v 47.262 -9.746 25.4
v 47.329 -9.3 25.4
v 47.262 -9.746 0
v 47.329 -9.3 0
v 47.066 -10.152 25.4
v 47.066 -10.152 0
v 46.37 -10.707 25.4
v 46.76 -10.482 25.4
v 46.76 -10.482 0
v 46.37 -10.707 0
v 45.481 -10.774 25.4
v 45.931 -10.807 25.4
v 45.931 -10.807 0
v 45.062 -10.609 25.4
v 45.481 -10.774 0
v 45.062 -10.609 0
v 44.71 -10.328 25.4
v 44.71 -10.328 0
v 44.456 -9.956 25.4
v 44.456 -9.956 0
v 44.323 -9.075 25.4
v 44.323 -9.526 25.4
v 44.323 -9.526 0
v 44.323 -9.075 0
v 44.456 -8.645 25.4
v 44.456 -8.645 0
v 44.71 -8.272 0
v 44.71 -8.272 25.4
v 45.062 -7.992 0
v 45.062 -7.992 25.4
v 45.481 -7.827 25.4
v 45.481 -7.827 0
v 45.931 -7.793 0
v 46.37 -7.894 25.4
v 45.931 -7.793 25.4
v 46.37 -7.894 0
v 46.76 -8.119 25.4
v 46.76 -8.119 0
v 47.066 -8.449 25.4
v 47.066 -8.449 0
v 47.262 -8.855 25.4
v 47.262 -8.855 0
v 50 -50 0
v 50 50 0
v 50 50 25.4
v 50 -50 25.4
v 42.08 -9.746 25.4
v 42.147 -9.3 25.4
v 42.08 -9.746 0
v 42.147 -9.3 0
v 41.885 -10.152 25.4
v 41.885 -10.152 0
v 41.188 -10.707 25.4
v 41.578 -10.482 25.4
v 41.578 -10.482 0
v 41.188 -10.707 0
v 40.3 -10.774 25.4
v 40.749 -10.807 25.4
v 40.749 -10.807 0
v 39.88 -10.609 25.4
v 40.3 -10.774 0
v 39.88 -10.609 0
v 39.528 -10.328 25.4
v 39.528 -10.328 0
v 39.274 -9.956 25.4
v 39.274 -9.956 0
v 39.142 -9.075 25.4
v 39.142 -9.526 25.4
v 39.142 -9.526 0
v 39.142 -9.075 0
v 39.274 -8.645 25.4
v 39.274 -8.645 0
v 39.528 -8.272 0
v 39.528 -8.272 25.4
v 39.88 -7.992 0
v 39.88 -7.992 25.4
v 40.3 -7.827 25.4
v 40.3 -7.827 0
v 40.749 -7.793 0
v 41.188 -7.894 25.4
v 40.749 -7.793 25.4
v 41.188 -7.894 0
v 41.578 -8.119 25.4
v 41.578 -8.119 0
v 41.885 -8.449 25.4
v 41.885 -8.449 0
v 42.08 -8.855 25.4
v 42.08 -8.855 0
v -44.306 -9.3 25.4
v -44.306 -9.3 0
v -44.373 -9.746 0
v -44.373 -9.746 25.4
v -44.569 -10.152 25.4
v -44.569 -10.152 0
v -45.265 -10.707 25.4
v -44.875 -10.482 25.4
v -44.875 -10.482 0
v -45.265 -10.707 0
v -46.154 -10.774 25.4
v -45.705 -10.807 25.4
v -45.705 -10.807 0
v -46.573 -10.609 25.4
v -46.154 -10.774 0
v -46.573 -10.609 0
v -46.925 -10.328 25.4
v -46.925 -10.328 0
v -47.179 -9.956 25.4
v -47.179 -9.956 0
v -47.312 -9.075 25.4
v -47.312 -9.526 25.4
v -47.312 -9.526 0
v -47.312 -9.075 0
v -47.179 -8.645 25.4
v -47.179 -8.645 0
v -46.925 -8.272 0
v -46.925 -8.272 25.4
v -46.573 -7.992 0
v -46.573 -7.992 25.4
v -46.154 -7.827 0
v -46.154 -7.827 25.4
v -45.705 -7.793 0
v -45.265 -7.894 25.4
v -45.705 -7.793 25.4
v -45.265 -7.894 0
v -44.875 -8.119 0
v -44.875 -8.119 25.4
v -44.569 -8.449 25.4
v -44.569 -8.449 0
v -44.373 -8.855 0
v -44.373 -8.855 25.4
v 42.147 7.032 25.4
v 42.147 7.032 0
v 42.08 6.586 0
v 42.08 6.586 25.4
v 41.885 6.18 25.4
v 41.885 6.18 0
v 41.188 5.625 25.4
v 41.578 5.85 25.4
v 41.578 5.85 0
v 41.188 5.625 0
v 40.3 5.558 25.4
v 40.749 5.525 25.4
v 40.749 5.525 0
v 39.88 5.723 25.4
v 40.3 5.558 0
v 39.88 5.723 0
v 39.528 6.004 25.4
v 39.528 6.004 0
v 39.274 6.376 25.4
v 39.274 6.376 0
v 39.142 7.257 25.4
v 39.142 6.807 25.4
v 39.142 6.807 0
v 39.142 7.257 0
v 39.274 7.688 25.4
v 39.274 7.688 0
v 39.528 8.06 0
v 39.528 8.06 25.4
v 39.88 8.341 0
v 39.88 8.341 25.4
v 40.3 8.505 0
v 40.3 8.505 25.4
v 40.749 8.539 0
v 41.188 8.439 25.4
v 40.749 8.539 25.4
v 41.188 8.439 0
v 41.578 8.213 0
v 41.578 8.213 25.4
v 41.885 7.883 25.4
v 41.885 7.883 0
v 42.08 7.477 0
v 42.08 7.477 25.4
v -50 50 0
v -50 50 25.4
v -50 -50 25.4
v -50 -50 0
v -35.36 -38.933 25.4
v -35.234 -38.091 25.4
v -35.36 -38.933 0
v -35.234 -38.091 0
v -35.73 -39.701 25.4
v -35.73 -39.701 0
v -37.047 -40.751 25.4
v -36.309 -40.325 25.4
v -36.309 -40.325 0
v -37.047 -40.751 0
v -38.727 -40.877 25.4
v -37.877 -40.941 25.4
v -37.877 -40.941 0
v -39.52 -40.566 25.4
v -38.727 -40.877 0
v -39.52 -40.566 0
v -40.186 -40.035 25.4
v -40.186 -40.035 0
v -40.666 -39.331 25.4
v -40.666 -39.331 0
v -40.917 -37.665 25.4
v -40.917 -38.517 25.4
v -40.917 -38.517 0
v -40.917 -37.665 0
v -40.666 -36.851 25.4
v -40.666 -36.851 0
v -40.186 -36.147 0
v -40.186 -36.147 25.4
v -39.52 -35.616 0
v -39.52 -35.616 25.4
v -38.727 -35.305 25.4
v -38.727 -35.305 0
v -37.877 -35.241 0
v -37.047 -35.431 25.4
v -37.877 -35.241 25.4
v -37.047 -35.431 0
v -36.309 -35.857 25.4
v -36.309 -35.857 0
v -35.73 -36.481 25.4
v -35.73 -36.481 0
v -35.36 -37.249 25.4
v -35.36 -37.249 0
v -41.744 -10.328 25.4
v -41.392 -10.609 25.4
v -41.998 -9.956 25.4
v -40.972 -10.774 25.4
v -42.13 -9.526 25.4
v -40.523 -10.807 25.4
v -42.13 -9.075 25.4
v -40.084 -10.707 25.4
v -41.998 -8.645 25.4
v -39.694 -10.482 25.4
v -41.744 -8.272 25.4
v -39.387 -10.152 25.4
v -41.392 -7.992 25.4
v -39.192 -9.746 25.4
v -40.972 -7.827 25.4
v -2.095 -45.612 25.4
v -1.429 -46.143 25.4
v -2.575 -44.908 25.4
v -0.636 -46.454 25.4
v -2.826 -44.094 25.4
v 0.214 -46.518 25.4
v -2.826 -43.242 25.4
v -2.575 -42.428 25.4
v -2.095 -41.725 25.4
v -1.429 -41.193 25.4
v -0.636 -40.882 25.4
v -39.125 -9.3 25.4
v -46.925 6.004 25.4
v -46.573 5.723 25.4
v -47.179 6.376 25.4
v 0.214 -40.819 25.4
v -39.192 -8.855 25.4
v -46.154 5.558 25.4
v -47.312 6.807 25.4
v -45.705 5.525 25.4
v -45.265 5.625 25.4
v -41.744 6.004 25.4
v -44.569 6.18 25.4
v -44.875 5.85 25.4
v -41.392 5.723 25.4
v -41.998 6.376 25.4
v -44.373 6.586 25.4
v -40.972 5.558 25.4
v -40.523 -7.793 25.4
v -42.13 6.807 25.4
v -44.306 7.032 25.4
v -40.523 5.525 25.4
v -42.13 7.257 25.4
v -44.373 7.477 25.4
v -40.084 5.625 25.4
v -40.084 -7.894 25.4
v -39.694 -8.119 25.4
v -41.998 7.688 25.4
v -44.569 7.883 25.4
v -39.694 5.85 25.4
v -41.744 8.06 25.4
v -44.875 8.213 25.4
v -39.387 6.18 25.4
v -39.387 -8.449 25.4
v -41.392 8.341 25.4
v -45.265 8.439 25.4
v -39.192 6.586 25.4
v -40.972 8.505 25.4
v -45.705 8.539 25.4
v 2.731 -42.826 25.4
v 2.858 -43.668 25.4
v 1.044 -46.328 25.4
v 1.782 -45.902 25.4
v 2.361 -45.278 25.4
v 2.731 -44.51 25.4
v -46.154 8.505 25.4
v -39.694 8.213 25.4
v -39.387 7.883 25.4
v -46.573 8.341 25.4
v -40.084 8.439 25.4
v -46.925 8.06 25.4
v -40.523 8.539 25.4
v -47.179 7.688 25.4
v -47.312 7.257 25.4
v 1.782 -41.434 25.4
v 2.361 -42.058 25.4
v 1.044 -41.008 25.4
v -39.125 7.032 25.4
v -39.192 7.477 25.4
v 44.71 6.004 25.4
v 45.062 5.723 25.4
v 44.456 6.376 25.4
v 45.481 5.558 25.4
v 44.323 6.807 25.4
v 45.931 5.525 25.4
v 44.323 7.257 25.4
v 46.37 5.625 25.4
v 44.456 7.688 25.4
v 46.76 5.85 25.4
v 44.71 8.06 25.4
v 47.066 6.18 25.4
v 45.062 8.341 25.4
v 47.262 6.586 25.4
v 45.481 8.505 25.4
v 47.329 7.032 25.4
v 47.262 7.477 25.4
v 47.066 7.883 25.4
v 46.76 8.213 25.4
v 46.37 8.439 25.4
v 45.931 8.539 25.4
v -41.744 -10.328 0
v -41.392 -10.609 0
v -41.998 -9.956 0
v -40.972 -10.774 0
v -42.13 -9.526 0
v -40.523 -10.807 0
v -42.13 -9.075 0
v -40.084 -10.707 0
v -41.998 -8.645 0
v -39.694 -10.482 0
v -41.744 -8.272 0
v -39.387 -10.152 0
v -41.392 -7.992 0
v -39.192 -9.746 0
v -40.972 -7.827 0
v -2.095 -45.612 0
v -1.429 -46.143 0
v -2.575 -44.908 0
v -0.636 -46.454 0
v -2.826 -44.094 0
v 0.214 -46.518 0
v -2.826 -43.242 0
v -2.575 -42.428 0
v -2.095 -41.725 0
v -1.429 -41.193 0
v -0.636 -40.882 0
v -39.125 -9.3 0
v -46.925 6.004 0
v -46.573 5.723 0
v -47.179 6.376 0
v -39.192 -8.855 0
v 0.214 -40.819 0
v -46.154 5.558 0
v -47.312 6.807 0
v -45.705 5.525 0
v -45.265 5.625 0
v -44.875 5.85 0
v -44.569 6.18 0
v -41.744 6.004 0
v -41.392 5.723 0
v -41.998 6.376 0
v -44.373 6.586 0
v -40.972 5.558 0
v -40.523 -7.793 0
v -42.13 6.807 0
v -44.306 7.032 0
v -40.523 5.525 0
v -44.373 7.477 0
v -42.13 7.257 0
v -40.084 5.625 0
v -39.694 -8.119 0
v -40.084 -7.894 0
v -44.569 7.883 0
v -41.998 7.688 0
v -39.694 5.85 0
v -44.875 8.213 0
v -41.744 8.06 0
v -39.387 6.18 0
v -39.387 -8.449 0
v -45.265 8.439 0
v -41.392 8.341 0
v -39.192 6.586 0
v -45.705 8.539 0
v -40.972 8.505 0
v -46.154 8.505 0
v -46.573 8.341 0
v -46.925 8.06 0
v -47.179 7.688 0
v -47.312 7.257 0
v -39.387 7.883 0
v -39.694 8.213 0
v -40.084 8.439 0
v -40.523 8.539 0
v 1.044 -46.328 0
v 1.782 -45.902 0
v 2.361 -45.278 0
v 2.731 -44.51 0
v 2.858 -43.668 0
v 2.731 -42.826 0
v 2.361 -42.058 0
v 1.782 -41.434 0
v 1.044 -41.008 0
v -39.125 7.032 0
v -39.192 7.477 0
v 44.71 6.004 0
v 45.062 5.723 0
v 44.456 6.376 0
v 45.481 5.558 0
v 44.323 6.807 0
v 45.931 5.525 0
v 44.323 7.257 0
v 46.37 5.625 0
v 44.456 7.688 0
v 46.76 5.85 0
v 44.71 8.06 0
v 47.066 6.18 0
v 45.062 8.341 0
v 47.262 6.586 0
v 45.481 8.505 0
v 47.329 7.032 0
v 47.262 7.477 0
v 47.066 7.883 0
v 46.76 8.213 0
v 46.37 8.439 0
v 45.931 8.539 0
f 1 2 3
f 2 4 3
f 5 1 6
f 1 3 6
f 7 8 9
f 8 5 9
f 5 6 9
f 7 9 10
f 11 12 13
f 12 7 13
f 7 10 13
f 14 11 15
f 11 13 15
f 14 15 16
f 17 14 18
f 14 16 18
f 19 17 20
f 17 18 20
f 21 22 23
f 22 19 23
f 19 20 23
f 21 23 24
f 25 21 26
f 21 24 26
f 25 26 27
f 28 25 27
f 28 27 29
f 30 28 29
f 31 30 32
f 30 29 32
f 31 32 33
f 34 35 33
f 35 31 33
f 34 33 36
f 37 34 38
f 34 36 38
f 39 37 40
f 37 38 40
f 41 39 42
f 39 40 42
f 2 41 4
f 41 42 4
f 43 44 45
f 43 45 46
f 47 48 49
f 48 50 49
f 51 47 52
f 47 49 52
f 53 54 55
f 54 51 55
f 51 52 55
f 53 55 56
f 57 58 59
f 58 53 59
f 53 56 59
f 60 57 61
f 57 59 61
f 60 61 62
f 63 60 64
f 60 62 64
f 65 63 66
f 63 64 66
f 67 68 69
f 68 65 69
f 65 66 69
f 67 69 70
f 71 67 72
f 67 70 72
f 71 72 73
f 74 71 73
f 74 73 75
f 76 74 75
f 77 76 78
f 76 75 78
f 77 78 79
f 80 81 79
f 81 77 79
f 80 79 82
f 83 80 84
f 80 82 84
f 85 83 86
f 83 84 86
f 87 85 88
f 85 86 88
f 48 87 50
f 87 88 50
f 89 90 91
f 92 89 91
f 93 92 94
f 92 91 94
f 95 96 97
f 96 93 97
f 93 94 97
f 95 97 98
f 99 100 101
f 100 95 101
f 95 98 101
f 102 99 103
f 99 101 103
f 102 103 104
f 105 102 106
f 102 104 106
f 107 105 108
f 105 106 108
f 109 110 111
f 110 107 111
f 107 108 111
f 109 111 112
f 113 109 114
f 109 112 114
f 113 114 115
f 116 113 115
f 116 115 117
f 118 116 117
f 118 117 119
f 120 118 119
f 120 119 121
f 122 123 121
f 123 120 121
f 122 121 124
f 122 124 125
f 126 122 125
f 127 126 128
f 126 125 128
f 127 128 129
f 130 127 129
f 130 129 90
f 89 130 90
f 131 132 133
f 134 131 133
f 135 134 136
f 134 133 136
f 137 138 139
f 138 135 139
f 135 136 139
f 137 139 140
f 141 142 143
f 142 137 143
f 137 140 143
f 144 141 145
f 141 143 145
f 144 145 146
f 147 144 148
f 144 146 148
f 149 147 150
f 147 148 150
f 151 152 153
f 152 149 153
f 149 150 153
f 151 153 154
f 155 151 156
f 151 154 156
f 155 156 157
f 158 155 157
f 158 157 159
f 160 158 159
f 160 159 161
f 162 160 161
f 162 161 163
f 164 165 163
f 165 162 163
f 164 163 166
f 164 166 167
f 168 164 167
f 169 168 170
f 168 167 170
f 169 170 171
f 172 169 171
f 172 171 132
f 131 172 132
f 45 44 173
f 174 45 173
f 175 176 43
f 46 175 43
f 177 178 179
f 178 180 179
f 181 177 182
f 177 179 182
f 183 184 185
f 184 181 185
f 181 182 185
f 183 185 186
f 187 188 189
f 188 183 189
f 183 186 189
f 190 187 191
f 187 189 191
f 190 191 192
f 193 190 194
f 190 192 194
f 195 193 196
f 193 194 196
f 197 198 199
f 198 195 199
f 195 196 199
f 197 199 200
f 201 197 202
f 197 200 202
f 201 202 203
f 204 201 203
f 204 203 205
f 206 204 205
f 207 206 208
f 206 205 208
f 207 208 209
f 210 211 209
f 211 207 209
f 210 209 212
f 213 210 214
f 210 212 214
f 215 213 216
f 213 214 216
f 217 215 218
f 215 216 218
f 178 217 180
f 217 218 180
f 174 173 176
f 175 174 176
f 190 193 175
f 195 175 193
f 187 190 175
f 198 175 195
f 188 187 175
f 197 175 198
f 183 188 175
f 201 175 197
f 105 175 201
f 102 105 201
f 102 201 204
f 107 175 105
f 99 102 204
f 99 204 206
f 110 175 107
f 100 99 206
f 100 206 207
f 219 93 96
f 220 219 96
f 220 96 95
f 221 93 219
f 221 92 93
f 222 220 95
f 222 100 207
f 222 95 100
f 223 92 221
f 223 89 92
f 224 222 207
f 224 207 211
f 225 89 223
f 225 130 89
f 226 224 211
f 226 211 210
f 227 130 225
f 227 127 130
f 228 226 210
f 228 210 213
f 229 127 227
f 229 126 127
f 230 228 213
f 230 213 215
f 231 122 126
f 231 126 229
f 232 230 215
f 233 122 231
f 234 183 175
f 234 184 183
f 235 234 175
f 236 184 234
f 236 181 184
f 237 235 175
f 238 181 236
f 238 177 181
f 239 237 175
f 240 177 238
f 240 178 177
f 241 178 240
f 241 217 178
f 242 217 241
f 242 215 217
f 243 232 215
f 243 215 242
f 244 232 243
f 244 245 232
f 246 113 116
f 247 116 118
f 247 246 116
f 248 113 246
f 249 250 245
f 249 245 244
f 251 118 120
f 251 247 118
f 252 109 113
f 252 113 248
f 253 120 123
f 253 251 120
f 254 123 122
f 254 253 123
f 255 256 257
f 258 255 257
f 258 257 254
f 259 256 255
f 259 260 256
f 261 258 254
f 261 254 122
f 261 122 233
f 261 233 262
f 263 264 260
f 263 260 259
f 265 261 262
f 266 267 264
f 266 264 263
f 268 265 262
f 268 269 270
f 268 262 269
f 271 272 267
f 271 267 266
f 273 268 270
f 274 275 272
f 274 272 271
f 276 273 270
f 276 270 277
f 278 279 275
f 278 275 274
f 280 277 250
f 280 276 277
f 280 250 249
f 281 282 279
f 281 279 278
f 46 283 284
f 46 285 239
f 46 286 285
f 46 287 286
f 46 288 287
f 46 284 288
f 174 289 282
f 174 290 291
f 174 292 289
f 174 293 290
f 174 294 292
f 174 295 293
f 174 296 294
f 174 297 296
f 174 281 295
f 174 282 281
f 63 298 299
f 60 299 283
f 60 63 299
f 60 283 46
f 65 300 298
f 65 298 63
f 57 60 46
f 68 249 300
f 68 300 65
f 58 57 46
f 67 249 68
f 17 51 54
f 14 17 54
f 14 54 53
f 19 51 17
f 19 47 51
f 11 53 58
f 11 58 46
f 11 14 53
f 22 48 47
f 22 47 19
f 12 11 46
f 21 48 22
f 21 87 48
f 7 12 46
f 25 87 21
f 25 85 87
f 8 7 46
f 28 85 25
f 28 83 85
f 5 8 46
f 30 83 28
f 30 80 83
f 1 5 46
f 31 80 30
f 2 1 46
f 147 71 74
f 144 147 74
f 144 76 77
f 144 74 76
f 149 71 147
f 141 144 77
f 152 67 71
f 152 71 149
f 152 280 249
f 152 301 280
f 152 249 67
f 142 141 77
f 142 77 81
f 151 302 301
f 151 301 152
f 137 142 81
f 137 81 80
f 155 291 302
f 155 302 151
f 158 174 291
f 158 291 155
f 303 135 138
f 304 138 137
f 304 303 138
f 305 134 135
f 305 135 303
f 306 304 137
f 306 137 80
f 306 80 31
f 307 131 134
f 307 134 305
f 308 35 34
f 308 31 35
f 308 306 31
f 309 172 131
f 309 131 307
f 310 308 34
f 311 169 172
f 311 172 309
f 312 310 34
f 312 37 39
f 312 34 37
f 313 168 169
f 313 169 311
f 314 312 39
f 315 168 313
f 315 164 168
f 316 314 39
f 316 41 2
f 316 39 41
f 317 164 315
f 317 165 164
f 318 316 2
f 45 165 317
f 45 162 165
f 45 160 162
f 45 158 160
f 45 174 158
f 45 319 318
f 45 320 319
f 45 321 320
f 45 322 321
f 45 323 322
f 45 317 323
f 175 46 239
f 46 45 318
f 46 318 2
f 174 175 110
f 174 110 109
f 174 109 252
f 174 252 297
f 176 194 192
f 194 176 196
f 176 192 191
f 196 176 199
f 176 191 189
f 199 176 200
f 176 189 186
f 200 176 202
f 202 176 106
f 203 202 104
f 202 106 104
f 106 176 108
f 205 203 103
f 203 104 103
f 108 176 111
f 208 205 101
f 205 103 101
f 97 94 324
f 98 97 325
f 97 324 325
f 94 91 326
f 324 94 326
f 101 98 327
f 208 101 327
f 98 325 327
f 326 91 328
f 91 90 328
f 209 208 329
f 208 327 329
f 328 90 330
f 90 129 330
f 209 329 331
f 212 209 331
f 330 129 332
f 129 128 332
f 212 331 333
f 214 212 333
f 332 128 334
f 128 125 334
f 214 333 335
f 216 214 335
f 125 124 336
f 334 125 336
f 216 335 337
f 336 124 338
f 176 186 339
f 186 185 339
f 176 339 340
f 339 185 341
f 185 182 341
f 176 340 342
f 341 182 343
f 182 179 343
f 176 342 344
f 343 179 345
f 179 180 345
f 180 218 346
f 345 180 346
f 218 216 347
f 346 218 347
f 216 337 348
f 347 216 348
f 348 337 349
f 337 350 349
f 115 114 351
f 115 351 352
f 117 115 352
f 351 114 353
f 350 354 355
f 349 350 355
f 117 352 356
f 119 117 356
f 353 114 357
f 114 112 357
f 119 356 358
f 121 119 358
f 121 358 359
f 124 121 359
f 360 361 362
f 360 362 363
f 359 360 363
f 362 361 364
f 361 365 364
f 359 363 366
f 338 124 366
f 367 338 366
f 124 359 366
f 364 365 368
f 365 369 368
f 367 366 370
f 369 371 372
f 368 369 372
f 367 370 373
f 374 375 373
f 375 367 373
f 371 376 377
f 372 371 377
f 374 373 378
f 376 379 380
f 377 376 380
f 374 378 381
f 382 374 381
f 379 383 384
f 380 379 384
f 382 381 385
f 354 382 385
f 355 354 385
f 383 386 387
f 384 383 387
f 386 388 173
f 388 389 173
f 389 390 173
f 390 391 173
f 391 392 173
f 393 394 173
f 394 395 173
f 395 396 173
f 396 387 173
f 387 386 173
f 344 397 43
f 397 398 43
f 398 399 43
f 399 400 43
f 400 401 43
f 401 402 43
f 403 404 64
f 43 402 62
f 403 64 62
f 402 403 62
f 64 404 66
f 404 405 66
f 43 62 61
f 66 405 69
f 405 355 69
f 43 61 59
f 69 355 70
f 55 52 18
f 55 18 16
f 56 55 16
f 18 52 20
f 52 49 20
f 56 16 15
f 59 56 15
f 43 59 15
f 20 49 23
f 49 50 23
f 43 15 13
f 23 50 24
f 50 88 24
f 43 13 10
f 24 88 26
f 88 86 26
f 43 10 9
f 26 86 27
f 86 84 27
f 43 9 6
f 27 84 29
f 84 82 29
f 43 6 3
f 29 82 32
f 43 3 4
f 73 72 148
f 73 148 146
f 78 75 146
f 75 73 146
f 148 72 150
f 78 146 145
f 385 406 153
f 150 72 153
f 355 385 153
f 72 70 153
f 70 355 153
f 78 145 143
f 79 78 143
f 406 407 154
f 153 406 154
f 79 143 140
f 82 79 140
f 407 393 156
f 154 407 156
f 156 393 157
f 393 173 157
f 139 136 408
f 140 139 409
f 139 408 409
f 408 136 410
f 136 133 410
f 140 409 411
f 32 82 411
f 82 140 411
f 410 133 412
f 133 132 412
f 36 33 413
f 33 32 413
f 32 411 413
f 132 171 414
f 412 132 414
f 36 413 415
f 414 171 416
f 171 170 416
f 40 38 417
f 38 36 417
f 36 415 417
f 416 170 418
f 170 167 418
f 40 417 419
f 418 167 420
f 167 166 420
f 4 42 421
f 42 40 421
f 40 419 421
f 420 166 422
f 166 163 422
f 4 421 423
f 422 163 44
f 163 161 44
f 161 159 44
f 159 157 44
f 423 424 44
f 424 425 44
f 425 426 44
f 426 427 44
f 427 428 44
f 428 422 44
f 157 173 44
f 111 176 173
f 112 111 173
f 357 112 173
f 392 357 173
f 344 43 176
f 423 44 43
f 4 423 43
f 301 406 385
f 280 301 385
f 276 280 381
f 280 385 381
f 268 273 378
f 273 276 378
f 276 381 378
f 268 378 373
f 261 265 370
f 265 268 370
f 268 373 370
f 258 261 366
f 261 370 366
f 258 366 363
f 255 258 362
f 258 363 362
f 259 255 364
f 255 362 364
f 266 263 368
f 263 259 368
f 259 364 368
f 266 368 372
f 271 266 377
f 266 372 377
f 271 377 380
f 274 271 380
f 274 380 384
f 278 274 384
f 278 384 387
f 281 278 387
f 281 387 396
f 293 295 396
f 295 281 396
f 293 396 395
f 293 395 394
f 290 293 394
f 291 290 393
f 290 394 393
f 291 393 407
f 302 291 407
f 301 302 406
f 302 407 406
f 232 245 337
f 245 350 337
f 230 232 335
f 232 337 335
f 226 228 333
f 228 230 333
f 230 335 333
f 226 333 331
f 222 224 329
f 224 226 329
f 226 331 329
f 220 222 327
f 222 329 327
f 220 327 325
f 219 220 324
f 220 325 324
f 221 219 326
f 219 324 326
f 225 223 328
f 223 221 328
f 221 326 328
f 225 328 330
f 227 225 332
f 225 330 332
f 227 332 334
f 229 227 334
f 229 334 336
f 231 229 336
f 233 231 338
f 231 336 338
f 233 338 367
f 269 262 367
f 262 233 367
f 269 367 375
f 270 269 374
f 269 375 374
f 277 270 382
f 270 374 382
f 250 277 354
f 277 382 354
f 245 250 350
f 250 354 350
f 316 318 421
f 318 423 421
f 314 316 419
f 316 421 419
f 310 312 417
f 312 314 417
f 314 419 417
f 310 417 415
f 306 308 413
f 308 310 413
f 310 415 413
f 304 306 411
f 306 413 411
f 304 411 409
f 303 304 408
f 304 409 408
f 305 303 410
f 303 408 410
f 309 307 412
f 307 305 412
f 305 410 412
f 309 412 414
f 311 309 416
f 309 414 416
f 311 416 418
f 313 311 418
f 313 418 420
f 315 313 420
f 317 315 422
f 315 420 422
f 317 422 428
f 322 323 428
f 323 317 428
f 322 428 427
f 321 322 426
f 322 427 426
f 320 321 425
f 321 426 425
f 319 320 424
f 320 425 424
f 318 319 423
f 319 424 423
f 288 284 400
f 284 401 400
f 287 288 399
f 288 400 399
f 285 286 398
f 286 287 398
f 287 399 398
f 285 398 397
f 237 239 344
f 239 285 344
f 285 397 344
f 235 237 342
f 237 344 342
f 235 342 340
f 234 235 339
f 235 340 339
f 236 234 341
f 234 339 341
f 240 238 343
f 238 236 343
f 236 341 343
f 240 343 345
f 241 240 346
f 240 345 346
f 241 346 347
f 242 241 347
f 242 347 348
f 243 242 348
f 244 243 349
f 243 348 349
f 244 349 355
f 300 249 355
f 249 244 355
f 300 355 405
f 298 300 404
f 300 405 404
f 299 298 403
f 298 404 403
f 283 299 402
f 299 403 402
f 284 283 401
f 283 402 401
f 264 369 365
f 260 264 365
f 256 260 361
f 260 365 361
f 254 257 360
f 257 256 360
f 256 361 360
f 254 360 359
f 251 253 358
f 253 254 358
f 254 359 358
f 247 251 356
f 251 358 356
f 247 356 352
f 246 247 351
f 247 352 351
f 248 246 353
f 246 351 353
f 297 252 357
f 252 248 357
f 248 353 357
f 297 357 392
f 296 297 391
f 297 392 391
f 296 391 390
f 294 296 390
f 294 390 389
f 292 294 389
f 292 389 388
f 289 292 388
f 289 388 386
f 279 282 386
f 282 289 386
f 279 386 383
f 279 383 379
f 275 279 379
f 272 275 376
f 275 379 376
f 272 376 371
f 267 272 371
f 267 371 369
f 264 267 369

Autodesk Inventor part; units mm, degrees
ref_plane "YZ Plane" through (0, 0, 0) normal (1, 0, 0) x (0, 1, 0)
ref_plane "XZ Plane" through (0, 0, 0) normal (0, 1, 0) x (-1, 0, 0)
ref_plane "XY Plane" through (0, 0, 0) normal (0, 0, 1) x (1, 0, 0)
sketch "Sketch1" plane through (0, 0, 0) normal (0, 0, 1) x (1, 0, 0)
  line L0 (-50, -50) -> (50, -50)
  line L1 (50, 50) -> (-50, 50)
  line L2 (-50, 50) -> (-50, -50)
  line L3 (50, -50) -> (-50, 50) construction
  circle A0 centre (0, -43.6681) radius 2.8575
  line L4 (50, 50) -> (50, -50)
  circle A1 centre (-38.091, -38.091) radius 2.8575
  circle A2 centre (40.636, -9.3004) radius 1.5113
  circle A3 centre (45.8176, -9.3004) radius 1.5113
  circle A4 centre (40.636, 7.0318) radius 1.5113
  circle A5 centre (45.8176, 7.0318) radius 1.5113
  circle A6 centre (-45.8176, 7.0318) radius 1.5113
  circle A7 centre (-40.636, 7.0318) radius 1.5113
  circle A8 centre (-45.8176, -9.3004) radius 1.5113
  circle A9 centre (-40.636, -9.3004) radius 1.5113
  dimension "d0" = 100
  dimension "d1" = 100
  dimension "d2" = 5.715
  dimension "d8" = 5.715
  dimension "d19" = 3.0226
  dimension "d24" = 2.159
  dimension "d25" = 13.3096
extrude "Extrusion3" add sketch "Sketch1" along normal blind 25.4
properties part number "fram jp"
